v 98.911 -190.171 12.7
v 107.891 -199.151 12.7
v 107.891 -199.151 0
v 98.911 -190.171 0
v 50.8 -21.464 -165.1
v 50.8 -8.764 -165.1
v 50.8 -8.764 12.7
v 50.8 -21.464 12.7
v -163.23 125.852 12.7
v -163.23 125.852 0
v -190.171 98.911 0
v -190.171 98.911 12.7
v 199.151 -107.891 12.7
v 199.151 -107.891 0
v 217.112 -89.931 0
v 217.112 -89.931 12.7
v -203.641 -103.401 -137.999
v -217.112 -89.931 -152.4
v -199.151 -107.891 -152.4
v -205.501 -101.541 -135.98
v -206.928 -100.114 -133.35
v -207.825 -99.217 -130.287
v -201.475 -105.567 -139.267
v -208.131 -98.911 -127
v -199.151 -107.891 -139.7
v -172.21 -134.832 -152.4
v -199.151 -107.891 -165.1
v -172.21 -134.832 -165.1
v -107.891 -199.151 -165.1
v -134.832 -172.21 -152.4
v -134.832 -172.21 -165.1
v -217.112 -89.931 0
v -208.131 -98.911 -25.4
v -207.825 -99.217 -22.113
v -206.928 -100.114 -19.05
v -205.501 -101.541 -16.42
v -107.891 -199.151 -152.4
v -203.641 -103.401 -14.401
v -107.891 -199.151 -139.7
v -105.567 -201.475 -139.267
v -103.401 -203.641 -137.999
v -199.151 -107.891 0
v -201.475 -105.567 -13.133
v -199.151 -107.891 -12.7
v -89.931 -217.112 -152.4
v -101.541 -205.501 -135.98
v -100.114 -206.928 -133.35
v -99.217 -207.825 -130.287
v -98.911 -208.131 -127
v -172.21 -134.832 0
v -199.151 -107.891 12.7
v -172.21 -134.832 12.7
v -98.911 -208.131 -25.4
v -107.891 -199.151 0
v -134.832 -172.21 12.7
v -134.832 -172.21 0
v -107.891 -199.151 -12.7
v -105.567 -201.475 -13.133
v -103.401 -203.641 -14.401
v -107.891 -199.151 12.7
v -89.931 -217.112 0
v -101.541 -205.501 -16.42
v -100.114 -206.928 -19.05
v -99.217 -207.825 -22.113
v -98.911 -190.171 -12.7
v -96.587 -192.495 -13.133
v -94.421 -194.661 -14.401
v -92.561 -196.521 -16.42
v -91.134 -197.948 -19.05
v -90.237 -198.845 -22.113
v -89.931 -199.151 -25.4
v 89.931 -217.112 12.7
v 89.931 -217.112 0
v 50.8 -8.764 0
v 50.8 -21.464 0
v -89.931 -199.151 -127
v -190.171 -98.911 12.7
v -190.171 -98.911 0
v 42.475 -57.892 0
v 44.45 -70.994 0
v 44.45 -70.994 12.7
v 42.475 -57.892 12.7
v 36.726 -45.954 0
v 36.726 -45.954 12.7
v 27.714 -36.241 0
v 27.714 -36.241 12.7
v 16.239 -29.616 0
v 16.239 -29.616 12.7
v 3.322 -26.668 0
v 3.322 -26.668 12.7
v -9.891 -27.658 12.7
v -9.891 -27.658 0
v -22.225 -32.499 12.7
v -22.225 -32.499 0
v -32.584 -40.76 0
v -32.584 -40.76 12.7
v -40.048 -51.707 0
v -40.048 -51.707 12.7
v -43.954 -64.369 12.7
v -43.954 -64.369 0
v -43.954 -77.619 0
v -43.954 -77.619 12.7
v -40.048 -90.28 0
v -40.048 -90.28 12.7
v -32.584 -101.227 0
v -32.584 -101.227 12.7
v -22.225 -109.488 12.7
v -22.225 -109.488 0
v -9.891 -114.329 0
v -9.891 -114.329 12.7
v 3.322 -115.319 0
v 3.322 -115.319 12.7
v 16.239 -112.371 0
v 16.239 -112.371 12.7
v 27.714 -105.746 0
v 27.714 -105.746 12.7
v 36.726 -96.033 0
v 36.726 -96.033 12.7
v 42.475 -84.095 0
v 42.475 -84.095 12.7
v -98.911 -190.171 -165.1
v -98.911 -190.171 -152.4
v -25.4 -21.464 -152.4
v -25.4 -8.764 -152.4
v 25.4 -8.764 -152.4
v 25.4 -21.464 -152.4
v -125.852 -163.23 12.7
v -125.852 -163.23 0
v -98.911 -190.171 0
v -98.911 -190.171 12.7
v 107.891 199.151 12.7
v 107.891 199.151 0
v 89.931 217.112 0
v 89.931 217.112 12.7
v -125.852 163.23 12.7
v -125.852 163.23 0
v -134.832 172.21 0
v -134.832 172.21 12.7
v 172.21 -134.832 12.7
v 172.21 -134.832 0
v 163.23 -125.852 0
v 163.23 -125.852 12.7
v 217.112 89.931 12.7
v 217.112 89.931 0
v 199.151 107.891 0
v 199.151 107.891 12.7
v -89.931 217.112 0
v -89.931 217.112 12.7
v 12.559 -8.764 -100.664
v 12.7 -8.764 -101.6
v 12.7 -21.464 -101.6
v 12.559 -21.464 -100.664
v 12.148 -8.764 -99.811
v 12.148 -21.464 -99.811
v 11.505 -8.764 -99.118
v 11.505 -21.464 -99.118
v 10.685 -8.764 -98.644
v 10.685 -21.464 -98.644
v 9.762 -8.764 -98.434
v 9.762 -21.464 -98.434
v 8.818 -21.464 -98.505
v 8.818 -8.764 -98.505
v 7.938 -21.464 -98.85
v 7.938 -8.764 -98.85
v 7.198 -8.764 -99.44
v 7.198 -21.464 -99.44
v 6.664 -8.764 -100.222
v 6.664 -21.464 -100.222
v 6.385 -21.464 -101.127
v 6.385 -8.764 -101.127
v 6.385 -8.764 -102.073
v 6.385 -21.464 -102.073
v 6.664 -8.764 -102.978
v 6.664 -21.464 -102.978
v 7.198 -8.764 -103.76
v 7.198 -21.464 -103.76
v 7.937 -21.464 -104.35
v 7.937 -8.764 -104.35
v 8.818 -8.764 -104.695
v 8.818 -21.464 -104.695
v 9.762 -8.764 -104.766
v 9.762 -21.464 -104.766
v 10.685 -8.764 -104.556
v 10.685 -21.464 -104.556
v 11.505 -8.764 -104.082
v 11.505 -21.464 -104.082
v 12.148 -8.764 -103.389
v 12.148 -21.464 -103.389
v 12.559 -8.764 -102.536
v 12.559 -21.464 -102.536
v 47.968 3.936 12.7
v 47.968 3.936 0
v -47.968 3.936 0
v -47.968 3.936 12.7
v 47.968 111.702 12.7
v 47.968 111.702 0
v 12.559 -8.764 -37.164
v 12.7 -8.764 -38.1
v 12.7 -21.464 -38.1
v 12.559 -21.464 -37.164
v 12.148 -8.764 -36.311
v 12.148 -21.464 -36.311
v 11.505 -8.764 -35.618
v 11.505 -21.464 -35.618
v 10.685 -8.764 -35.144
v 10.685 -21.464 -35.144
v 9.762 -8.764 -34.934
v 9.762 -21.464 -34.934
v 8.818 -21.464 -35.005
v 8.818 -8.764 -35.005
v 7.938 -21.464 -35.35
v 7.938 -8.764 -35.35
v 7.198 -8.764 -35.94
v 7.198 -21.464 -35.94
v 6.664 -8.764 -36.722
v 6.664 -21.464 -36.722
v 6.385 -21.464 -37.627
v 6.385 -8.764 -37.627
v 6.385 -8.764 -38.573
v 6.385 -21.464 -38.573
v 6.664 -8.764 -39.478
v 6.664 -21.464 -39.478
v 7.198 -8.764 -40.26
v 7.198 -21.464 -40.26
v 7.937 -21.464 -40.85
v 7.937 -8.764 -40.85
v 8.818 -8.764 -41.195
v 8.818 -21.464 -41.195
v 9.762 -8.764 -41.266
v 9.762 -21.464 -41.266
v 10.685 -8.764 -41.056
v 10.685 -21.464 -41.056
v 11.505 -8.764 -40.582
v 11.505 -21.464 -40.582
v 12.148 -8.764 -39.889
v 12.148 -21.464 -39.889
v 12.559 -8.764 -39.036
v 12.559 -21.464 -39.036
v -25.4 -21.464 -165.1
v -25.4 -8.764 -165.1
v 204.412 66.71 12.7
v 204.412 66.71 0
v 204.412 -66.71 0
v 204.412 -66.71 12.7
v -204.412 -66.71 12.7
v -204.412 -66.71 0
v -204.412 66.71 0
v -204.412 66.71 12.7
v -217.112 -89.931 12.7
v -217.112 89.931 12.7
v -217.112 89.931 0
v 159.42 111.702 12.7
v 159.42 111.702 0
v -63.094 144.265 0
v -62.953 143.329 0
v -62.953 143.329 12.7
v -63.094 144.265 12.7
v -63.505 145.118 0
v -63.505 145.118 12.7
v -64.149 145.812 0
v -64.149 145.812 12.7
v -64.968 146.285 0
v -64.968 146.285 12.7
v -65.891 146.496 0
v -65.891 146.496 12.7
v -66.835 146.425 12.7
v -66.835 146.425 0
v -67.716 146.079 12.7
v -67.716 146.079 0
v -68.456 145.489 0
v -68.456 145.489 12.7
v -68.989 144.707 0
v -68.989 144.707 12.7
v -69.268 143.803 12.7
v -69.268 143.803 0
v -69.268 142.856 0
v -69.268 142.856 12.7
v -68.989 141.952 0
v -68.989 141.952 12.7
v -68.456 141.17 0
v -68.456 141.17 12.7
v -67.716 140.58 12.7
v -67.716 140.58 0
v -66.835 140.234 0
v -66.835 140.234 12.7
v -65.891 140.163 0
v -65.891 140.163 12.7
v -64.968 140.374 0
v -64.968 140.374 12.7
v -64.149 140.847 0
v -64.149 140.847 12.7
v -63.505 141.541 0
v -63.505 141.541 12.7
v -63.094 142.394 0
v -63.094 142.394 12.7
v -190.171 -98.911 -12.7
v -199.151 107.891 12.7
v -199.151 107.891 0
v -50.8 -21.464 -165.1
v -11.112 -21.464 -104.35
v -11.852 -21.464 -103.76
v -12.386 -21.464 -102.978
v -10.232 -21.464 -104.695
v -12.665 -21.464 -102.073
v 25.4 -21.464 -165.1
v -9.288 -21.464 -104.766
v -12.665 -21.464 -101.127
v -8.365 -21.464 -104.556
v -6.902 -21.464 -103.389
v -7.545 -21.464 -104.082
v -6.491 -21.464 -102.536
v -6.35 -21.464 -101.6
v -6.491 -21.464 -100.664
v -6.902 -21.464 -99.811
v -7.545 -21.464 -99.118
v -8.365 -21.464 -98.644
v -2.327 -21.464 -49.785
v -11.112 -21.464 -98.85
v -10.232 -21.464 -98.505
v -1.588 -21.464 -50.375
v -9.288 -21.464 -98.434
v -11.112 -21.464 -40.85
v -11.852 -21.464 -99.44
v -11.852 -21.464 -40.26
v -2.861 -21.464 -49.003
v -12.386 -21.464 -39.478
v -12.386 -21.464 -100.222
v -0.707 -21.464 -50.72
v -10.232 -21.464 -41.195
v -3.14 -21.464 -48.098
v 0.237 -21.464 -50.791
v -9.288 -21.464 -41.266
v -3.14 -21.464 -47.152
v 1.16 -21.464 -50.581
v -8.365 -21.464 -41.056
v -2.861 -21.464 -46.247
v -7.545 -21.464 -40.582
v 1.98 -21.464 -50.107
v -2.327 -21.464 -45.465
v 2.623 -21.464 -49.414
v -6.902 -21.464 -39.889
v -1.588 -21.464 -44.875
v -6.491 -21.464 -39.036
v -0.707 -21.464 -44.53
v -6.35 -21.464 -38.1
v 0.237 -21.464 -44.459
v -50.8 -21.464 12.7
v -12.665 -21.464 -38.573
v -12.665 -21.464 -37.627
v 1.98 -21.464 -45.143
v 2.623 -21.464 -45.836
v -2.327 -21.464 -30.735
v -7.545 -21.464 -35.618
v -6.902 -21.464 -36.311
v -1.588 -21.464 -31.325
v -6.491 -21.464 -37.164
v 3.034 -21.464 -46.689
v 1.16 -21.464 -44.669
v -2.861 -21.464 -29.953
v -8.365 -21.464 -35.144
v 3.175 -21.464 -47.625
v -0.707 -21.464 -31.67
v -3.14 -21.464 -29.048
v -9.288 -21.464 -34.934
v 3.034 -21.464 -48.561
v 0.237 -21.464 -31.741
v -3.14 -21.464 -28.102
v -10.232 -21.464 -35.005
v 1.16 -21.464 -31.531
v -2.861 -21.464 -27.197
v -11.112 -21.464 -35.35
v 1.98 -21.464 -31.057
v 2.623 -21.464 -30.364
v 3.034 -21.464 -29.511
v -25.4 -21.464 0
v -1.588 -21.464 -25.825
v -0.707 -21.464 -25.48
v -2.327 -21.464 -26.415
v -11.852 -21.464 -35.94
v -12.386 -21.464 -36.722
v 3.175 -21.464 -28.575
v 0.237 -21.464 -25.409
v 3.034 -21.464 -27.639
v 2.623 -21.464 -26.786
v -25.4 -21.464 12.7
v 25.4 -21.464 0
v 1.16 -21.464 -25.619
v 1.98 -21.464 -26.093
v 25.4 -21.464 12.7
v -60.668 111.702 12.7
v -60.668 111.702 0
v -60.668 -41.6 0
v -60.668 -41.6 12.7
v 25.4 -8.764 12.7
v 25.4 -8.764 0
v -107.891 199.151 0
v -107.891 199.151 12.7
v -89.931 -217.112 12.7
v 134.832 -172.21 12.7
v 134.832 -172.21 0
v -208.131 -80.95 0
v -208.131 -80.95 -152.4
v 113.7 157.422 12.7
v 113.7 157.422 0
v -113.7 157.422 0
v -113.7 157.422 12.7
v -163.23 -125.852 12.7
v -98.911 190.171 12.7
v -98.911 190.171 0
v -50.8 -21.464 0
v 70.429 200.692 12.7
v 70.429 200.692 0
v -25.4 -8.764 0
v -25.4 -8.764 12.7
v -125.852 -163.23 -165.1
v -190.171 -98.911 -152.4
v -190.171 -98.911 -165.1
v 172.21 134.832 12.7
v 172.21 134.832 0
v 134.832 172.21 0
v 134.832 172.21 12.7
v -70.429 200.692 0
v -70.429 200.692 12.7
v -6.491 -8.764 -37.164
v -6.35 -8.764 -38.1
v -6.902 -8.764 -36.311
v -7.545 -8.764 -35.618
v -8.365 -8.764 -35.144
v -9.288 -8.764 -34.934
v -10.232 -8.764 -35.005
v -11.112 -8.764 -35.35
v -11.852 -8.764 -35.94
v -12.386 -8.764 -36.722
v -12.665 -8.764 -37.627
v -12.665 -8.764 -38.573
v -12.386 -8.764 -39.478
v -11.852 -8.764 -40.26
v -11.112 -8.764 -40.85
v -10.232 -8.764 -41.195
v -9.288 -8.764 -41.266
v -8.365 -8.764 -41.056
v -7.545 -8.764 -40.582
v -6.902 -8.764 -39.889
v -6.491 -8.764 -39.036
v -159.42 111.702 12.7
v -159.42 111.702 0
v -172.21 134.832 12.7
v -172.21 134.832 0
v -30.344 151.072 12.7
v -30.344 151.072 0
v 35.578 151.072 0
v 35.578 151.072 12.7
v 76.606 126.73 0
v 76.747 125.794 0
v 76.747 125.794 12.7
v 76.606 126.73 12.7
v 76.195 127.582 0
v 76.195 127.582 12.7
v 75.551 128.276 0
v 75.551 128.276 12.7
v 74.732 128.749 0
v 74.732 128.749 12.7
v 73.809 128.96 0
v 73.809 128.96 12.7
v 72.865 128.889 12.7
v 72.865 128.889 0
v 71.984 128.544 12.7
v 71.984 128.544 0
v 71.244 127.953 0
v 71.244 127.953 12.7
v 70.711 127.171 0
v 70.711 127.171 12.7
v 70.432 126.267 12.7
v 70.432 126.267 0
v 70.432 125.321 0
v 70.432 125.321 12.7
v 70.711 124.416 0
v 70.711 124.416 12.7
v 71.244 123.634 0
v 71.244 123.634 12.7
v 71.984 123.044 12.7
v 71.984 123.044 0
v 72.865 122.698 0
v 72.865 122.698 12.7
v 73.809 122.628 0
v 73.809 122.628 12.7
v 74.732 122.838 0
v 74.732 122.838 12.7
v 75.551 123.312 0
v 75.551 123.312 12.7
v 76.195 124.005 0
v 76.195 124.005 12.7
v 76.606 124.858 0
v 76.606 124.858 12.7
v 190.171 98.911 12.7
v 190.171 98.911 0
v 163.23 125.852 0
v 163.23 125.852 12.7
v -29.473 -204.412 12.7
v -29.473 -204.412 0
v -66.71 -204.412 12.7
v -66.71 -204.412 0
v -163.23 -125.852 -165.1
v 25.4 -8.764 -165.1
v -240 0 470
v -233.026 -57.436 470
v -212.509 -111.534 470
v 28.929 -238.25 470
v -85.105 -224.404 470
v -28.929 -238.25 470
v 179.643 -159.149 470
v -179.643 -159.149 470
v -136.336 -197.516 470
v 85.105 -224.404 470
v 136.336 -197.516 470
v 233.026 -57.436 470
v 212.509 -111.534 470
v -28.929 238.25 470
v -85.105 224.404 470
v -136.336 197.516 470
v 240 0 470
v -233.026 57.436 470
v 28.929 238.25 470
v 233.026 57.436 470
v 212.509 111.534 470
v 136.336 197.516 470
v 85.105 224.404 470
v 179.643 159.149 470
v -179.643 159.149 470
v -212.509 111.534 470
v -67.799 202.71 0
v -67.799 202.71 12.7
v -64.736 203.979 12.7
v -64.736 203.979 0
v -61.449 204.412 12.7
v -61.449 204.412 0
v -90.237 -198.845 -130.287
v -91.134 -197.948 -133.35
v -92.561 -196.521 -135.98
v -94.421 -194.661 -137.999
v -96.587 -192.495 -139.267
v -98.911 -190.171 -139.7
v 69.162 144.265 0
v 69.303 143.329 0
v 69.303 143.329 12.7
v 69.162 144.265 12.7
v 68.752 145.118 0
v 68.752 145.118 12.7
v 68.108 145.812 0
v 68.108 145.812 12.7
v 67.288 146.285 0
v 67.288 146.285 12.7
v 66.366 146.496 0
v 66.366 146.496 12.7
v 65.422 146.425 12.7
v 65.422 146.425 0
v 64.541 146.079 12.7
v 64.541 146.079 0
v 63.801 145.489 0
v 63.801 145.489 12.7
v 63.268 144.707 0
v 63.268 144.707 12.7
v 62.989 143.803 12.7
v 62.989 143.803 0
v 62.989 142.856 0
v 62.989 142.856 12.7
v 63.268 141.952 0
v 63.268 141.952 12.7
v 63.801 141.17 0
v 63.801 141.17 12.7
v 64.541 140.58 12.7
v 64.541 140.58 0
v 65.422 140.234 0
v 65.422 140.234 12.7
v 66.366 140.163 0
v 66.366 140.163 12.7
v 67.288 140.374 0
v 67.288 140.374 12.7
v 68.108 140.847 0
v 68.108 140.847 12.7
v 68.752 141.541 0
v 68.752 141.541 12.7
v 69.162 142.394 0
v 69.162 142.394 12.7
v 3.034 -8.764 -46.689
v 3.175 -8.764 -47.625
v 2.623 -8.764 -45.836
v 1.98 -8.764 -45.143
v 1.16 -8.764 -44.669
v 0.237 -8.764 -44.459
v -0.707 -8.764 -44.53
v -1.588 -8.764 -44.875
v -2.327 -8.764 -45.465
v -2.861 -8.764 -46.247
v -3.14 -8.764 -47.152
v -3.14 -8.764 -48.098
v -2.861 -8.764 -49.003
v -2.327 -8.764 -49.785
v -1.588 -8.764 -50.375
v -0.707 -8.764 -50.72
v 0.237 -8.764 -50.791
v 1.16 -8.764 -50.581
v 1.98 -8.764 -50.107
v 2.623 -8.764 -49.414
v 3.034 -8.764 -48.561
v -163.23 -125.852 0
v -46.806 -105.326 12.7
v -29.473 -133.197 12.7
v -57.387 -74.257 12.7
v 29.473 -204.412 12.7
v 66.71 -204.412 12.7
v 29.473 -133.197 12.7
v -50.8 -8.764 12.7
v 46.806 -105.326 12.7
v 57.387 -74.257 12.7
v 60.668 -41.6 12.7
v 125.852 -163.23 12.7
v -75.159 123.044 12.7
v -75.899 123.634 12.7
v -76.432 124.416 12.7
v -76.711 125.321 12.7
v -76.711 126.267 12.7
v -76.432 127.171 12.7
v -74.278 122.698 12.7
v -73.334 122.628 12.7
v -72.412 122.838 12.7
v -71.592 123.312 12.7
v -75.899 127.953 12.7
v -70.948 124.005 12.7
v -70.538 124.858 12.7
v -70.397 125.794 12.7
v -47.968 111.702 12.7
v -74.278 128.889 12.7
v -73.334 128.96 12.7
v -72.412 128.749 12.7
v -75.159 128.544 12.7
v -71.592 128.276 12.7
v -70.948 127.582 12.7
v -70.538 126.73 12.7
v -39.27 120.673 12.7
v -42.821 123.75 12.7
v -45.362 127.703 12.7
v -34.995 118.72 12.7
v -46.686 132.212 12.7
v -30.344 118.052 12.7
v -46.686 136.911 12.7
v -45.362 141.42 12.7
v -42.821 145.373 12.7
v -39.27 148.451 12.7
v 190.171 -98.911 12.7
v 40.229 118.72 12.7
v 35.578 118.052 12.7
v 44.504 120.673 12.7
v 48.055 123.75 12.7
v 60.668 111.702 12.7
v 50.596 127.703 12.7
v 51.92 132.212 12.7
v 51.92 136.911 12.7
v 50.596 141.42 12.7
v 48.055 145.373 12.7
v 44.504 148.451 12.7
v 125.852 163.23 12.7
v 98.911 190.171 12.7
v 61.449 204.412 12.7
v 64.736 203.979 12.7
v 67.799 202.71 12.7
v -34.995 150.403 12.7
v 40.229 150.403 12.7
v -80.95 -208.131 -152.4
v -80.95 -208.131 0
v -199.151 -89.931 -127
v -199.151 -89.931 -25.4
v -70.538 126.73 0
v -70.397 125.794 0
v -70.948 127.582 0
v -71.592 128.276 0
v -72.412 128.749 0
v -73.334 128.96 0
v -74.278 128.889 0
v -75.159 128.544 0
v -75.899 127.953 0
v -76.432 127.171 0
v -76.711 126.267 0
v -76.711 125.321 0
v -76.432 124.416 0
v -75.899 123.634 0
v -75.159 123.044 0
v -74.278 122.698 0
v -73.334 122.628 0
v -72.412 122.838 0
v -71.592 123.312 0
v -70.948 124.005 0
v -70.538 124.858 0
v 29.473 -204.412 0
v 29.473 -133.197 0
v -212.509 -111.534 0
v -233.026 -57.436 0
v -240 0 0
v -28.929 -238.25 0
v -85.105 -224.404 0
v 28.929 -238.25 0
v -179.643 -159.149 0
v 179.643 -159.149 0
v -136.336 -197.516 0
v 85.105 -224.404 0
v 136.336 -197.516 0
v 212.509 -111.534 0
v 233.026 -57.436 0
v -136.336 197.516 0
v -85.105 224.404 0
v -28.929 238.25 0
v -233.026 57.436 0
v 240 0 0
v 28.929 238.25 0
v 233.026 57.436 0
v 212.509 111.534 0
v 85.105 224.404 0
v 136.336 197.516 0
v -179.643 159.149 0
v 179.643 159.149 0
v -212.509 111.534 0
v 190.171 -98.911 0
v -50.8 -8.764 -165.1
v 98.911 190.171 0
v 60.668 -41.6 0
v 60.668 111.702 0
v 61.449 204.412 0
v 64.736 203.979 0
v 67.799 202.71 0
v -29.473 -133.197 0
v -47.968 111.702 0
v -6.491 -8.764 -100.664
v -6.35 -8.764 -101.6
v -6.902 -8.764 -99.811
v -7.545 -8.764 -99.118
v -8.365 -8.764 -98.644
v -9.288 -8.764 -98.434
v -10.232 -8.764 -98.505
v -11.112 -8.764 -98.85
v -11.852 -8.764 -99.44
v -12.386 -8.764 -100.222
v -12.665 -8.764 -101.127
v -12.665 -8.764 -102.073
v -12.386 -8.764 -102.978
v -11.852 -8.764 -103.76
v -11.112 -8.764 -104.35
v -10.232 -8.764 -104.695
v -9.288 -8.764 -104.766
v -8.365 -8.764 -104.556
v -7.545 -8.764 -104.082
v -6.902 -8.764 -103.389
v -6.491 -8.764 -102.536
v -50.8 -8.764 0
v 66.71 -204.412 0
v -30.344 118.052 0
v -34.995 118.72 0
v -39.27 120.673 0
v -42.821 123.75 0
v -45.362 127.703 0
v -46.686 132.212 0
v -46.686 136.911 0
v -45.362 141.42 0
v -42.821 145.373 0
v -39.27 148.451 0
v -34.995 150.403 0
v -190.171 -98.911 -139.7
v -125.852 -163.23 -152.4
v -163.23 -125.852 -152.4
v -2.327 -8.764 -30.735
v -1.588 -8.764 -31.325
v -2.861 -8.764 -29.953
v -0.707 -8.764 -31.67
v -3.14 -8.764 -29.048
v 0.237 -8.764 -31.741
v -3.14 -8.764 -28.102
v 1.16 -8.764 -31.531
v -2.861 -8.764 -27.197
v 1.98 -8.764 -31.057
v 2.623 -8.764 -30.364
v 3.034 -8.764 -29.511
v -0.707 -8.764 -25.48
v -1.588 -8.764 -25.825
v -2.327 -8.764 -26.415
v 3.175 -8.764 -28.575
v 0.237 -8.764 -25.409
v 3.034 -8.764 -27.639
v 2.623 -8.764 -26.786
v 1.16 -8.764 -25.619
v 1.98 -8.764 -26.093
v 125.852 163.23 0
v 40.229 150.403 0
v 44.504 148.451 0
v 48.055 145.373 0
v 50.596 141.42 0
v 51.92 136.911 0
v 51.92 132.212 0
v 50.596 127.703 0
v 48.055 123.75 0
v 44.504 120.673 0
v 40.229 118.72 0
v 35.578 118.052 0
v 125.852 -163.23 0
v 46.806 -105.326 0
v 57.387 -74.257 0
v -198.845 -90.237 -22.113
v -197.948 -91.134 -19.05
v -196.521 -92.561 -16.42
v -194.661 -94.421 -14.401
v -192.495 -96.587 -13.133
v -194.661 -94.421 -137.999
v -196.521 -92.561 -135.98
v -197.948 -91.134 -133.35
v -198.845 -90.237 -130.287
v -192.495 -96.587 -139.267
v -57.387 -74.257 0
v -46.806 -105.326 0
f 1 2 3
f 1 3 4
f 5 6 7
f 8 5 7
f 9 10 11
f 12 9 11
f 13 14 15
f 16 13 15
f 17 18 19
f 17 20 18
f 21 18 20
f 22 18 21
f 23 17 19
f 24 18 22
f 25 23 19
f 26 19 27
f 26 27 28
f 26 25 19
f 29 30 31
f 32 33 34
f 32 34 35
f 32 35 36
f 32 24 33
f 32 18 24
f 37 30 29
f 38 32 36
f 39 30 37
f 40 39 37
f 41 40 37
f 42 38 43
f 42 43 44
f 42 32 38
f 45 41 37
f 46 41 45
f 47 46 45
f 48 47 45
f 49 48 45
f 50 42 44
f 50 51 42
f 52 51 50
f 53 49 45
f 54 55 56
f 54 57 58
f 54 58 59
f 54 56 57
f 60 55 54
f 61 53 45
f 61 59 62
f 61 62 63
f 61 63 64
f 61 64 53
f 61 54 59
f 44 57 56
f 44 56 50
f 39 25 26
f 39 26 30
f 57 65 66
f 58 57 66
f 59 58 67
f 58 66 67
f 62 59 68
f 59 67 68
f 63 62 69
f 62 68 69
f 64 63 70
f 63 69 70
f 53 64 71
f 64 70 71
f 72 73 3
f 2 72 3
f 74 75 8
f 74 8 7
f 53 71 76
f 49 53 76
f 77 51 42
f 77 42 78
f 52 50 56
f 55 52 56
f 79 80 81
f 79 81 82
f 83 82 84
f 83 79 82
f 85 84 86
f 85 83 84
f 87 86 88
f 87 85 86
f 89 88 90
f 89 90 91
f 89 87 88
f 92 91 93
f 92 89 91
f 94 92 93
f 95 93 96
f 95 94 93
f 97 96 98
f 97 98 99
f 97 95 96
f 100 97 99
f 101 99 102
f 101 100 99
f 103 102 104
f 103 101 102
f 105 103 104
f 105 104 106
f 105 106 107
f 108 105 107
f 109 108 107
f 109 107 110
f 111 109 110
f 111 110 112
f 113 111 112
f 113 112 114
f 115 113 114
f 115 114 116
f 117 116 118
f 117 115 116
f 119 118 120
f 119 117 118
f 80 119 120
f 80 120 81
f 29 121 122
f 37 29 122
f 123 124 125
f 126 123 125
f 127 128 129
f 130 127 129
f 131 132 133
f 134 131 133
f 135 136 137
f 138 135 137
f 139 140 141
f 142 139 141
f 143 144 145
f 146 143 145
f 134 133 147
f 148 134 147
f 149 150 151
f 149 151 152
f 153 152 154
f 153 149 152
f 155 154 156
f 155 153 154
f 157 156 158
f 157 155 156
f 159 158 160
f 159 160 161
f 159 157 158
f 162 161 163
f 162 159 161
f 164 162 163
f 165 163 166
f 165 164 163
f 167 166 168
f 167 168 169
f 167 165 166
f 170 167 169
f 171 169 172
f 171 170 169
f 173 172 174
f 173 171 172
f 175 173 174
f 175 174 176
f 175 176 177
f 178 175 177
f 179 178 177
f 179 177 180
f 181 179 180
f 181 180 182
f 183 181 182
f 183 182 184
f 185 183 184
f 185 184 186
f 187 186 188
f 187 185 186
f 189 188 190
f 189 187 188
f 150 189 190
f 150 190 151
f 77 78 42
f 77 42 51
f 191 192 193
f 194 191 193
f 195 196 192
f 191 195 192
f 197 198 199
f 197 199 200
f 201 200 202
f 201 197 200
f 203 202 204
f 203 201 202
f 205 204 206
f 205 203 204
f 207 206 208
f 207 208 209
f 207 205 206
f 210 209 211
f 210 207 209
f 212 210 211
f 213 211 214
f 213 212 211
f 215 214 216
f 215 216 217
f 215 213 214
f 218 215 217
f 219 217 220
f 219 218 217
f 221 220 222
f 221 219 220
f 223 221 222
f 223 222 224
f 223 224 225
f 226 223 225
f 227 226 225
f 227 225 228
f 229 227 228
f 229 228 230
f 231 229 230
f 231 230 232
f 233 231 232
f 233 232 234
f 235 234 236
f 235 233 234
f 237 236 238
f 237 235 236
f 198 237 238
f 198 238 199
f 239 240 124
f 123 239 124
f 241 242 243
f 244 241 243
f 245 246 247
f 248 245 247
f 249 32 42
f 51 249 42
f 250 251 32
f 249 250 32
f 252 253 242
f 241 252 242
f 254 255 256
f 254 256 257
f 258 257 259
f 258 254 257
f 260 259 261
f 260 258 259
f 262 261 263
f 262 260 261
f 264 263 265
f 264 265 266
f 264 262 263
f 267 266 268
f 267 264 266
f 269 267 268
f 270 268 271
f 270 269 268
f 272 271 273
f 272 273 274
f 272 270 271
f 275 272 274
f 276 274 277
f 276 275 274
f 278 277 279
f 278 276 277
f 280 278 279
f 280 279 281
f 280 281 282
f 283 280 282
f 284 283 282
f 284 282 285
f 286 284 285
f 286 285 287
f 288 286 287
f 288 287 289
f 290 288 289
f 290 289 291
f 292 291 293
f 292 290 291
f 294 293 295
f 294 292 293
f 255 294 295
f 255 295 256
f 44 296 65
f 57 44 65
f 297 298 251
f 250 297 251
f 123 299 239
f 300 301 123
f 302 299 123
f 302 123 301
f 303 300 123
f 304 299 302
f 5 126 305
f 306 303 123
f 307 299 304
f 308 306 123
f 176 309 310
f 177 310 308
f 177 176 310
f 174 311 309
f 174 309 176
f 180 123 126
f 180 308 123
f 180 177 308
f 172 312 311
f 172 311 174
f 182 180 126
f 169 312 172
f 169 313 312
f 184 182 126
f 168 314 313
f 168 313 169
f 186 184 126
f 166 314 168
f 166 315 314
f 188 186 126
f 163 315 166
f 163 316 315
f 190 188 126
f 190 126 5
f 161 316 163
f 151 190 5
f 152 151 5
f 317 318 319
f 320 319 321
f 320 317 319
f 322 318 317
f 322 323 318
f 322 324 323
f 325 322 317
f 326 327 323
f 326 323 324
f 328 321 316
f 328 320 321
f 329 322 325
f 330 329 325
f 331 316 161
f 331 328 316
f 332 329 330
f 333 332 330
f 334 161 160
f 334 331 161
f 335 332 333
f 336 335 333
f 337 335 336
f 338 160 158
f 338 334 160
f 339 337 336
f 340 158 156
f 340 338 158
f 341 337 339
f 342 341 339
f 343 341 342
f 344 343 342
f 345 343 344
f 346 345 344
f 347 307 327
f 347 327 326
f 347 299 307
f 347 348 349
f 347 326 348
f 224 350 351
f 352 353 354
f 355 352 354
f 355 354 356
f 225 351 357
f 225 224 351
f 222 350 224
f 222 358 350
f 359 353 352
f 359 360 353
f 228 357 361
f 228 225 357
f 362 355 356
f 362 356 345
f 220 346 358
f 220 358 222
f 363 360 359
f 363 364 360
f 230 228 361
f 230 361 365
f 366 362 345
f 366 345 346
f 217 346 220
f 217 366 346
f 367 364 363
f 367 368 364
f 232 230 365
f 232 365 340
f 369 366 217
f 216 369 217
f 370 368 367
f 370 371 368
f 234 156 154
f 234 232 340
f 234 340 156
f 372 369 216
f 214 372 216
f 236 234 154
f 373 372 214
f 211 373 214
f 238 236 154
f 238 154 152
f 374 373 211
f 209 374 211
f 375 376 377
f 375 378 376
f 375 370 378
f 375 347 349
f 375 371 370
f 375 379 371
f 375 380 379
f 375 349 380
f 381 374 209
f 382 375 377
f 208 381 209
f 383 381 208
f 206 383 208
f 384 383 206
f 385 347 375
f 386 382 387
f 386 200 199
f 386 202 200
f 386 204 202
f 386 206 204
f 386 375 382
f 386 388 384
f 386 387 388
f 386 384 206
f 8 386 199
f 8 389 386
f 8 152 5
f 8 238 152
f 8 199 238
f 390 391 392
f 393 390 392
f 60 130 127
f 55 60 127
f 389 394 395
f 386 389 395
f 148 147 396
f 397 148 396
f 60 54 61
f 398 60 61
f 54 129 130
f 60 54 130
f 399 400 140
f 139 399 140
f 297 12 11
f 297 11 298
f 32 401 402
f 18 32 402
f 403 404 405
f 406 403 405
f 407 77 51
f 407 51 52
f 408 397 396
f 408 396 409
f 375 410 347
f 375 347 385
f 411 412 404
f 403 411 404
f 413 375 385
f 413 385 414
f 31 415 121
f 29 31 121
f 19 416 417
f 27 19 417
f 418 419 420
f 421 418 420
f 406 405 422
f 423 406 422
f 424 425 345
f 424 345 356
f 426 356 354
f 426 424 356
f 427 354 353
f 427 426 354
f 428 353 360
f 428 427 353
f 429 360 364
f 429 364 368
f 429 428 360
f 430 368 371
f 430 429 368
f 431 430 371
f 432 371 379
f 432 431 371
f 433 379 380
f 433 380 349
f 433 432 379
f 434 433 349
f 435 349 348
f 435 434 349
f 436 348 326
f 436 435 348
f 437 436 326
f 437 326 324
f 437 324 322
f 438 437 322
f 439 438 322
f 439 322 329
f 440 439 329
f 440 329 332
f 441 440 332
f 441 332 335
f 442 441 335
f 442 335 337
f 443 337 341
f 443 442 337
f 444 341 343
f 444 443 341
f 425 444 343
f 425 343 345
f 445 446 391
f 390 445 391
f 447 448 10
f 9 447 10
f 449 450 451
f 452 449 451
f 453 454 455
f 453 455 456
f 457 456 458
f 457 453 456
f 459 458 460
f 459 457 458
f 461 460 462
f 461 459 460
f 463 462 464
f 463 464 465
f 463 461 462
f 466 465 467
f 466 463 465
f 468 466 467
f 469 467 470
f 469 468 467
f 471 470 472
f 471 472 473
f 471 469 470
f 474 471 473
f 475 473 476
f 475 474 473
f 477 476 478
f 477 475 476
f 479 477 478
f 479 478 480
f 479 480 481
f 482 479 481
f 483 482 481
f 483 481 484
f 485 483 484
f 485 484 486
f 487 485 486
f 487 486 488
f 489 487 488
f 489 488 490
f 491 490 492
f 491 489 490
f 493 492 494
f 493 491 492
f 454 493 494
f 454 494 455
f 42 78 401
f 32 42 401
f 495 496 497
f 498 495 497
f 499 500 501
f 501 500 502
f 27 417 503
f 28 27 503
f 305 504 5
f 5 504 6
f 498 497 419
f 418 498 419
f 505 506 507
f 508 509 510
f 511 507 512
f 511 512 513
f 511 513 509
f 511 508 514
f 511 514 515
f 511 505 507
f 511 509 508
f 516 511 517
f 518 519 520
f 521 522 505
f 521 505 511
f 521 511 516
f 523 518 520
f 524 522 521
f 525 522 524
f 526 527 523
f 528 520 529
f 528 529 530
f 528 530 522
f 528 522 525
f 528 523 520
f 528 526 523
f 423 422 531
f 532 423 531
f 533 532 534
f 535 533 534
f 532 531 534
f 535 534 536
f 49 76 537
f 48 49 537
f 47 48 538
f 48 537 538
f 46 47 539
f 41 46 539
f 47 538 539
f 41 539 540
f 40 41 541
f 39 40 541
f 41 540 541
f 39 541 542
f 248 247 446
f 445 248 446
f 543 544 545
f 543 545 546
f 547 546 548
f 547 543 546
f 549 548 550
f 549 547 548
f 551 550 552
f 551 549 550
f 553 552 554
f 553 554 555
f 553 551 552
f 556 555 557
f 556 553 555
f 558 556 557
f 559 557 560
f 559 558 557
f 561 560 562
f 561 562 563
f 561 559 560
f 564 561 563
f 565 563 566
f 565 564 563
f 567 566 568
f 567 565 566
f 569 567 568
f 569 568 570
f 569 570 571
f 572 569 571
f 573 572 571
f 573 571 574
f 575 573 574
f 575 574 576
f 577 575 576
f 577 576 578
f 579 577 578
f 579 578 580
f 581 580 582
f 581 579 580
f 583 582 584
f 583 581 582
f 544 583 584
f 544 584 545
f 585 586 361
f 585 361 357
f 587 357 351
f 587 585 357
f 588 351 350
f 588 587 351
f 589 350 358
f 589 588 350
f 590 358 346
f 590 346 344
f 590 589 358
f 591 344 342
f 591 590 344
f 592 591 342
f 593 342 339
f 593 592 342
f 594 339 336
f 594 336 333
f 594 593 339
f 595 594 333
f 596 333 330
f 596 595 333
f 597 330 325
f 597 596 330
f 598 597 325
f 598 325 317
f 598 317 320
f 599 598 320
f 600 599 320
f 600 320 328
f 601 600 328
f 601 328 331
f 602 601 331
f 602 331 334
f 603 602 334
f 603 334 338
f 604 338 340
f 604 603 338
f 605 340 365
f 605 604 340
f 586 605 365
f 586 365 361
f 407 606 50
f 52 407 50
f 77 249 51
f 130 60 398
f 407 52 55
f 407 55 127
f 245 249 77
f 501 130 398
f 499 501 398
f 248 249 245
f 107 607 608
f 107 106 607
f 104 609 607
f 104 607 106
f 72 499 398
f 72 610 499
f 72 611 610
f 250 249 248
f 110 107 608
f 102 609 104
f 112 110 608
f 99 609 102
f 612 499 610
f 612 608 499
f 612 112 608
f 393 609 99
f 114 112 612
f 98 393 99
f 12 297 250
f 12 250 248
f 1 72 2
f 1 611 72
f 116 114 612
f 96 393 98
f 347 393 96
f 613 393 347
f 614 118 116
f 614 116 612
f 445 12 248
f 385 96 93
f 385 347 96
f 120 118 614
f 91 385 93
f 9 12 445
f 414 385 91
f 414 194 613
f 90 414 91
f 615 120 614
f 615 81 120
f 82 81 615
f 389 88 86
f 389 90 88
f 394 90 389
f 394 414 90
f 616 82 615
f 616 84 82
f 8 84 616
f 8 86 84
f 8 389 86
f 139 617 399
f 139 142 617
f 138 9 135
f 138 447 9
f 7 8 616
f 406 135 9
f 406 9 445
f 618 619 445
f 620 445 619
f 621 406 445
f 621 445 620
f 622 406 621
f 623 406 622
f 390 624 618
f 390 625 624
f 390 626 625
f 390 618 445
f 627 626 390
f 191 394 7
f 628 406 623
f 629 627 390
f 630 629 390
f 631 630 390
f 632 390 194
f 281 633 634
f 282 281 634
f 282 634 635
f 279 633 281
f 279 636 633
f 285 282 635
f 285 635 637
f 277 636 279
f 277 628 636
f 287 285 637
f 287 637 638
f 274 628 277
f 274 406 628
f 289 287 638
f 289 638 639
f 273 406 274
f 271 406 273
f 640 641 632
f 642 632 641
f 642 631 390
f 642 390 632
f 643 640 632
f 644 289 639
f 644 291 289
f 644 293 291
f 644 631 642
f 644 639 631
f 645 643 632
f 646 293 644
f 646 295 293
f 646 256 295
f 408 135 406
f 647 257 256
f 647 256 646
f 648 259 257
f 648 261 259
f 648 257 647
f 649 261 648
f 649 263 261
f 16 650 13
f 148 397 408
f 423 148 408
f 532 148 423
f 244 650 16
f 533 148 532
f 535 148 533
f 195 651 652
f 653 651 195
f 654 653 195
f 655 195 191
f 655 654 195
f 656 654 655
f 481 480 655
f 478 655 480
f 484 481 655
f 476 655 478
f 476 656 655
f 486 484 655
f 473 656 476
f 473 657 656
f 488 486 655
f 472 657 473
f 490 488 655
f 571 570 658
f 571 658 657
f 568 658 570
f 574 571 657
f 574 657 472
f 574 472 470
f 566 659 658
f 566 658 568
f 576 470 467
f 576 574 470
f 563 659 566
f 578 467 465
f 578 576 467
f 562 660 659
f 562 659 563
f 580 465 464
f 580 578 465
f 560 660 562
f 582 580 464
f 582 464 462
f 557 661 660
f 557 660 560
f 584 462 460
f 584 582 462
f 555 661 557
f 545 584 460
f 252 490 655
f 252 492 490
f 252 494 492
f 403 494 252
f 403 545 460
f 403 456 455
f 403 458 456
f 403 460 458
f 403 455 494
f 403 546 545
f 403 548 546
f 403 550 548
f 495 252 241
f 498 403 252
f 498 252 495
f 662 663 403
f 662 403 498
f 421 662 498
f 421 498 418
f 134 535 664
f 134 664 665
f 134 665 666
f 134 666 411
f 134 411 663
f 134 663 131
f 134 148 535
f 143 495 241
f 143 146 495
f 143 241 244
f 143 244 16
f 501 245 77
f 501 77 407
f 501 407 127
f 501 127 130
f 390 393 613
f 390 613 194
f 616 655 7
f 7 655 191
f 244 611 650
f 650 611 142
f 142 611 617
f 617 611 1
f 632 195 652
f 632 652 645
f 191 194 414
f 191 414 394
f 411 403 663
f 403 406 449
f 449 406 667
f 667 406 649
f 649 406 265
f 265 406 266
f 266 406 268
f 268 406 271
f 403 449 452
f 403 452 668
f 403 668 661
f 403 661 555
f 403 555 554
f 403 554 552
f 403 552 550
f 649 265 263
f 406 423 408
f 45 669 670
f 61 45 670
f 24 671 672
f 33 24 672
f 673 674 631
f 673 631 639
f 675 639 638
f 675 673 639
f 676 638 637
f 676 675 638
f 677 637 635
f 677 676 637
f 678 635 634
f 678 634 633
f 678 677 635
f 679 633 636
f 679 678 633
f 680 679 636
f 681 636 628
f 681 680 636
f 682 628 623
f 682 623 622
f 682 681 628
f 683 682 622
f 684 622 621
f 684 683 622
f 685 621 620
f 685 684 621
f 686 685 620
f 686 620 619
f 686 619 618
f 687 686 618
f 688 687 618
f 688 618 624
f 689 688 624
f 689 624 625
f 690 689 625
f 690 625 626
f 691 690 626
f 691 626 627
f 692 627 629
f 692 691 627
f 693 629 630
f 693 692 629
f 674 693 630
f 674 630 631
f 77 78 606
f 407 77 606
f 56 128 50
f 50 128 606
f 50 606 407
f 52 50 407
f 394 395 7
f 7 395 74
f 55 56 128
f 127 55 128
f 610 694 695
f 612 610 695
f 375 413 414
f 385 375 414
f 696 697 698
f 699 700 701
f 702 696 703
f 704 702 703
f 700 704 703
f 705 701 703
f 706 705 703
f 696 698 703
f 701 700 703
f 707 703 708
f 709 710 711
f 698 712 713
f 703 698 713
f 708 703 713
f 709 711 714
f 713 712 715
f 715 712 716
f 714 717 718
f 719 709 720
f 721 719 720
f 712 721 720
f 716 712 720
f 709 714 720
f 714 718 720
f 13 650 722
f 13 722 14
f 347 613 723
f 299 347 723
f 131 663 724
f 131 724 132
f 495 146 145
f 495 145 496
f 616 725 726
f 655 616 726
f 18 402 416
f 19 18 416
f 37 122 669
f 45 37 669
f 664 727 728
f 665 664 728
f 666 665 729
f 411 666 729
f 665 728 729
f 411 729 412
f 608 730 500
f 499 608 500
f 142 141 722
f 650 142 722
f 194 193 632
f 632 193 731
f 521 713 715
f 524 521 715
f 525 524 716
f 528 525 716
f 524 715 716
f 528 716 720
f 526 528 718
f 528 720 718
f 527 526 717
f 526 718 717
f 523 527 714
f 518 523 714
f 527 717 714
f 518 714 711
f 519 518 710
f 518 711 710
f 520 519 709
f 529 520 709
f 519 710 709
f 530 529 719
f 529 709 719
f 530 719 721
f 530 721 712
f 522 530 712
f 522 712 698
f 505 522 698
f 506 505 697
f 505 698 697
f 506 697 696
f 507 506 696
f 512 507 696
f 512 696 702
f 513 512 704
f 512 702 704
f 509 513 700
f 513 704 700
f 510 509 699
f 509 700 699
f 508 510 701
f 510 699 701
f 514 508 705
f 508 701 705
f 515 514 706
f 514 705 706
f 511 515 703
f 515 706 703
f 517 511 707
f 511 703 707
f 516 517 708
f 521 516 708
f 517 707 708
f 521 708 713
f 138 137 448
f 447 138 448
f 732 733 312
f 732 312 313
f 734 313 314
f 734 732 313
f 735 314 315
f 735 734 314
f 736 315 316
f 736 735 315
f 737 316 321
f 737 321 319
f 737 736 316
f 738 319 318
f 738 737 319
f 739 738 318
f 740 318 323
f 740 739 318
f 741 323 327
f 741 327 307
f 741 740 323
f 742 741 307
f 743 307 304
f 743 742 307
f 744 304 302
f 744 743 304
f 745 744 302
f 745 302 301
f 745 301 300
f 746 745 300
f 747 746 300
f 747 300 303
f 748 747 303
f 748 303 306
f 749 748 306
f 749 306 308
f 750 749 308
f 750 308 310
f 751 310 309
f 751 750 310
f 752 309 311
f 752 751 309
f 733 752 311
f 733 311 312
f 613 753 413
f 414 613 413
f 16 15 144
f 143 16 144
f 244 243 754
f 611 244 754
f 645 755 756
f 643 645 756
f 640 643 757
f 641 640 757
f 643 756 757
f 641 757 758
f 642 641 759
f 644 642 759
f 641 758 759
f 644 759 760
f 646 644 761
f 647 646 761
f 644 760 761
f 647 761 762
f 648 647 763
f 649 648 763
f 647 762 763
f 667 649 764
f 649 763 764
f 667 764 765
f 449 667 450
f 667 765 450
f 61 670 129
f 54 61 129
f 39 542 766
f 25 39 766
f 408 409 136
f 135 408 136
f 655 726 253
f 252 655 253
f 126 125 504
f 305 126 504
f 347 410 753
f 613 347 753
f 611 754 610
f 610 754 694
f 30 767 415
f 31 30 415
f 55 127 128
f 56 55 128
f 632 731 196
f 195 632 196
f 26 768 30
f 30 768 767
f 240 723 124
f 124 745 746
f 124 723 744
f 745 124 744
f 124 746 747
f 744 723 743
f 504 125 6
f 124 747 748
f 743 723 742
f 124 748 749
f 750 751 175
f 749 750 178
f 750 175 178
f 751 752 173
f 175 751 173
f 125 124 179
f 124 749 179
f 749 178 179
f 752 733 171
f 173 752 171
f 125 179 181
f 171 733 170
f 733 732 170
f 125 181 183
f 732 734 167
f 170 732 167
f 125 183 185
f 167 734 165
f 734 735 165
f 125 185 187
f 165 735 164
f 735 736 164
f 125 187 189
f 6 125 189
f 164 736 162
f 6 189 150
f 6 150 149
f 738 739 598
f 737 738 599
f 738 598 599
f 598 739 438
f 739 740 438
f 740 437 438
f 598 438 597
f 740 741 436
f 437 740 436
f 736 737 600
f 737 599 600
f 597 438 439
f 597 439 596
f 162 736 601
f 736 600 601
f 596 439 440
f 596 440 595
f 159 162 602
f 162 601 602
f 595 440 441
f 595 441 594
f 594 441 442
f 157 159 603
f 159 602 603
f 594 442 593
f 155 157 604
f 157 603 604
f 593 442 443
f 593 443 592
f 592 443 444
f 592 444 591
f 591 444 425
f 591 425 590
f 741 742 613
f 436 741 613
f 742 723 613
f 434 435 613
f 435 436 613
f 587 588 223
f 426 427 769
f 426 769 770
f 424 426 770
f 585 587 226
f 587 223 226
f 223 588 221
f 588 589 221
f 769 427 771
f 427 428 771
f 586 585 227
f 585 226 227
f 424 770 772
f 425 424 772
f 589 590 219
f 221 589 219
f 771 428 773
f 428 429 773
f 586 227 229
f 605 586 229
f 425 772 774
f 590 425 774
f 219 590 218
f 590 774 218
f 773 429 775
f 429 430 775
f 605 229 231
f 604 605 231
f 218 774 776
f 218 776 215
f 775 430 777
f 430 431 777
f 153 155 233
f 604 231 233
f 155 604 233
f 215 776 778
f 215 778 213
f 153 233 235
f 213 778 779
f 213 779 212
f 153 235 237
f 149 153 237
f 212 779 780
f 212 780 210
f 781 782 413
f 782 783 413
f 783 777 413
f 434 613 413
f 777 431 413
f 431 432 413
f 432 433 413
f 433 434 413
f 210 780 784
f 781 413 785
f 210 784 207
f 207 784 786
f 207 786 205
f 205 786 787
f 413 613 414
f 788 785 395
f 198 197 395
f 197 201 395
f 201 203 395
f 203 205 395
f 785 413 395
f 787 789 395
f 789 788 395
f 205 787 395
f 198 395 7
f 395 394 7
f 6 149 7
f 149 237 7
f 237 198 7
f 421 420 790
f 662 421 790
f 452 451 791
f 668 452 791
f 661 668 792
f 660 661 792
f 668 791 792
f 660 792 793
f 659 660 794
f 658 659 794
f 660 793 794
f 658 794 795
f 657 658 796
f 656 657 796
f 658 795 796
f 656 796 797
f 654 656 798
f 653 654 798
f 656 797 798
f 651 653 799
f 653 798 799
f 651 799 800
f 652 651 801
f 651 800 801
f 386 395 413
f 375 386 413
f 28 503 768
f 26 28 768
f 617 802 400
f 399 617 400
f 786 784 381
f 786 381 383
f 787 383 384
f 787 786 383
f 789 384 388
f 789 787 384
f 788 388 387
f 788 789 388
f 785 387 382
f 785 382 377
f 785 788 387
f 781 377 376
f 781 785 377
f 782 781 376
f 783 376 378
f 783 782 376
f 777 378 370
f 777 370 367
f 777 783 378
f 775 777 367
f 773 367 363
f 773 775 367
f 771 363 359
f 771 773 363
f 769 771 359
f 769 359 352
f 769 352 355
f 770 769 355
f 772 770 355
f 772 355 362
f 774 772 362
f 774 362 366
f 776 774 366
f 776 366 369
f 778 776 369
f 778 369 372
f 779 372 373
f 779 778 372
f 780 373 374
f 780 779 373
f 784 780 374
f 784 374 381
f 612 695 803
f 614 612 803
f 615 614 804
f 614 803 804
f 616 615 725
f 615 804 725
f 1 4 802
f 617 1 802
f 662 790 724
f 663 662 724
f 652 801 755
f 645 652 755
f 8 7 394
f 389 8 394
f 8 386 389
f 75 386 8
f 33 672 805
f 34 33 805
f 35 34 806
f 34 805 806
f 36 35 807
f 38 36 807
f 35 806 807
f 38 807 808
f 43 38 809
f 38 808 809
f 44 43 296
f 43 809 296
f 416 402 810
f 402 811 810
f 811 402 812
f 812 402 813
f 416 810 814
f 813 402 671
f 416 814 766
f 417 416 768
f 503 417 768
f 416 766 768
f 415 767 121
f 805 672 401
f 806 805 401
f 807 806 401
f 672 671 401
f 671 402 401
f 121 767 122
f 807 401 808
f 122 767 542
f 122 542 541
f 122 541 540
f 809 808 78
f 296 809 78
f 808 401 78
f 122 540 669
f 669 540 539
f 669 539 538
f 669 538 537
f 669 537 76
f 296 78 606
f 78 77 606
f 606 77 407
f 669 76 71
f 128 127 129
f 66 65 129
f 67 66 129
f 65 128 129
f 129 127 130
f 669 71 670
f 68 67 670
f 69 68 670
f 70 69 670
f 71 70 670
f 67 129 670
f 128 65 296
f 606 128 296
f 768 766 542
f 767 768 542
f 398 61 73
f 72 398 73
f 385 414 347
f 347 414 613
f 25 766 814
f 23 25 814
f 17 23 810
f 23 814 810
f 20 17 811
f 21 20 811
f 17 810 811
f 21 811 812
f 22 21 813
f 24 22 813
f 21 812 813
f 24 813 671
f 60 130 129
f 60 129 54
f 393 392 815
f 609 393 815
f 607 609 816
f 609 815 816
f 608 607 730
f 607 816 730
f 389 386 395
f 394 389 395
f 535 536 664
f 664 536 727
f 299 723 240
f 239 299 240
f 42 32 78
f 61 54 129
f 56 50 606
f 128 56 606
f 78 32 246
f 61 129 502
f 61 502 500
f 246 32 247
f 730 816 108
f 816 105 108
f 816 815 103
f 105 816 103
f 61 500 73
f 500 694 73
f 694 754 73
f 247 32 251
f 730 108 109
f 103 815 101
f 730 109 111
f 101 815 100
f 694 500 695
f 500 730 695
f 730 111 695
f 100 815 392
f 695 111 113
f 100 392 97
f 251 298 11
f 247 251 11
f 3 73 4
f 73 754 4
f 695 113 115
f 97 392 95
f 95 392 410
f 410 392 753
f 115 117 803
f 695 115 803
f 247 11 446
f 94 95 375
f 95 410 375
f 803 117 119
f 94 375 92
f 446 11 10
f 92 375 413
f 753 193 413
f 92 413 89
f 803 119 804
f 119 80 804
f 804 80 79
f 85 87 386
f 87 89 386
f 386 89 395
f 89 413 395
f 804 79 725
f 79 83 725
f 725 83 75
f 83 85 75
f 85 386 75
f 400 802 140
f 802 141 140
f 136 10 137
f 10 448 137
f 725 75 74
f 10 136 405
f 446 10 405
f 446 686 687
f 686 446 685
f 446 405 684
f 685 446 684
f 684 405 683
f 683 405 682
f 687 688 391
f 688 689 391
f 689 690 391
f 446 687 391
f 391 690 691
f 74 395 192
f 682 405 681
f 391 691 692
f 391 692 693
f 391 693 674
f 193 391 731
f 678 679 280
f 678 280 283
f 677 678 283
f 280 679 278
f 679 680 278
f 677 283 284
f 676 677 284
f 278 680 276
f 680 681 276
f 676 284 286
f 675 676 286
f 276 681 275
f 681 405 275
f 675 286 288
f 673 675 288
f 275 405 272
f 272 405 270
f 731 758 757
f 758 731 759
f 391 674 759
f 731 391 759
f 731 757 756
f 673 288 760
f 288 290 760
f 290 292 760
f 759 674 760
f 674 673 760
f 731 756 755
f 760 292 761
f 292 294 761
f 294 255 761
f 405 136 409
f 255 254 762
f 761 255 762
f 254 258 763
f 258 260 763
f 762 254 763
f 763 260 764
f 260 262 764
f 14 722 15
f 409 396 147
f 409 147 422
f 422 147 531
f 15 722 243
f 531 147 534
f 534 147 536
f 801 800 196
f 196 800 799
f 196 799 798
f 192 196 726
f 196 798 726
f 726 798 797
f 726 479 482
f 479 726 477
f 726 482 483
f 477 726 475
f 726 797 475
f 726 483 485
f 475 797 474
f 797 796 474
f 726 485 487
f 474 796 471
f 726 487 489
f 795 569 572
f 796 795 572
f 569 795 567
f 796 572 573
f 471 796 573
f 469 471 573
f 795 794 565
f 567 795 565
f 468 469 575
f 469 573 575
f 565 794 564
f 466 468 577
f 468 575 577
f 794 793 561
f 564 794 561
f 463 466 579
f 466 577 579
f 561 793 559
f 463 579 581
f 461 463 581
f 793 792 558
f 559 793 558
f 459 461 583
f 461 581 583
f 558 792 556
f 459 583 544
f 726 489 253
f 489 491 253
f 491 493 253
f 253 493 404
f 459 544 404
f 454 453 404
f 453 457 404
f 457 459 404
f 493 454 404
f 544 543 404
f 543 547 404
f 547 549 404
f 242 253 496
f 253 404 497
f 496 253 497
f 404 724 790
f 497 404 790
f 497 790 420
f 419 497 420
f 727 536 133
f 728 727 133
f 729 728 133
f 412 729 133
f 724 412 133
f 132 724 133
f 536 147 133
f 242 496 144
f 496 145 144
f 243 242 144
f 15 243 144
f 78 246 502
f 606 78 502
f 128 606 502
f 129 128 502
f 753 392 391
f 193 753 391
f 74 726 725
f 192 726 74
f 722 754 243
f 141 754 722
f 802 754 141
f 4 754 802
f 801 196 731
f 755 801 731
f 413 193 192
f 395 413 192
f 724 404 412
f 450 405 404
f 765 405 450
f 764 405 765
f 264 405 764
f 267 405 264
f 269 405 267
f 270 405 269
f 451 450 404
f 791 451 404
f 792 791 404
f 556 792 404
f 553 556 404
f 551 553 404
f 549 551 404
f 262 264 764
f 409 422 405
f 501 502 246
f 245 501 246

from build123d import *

# Parameters (mm, degrees)
F0_R     = 240
F1_DEPTH = 470
F2_R     = 3.175
F2_W     = 25.4
F2_H     = 12.7
F2_R_2   = 44.45
F3_DEPTH = 12.7
F4_W     = 38.1
F4_H     = 12.7
F5_DEPTH = 12.7
F6_R     = 3.175
F7_DEPTH = 12.7


# Not quite as in the source:
# - a feature names something its author has since deleted; it is built from what else it names


with BuildPart() as f1:
    # F0 (on Top) → F1 (new body)
    with BuildSketch(Plane.XY):
        Circle(F0_R)
    extrude(amount=F1_DEPTH)


with BuildPart() as f3:
    # F2 (on Top) → F3 (new body)
    with BuildSketch(Plane.XY):
        Polygon((107.8911188479, 199.151177898), (89.9306066058, 217.1116901402), (-89.9306066058, 217.1116901402), (-107.8911188479, 199.151177898), (-98.9108627269, 190.1709217769), (-125.8516310901, 163.2301534137), (-134.8318872111, 172.2104095348), (-172.2104095348, 134.8318872111), (-163.2301534137, 125.8516310901), (-190.1709217769, 98.9108627269), (-199.151177898, 107.8911188479), (-217.1116901402, 89.9306066058), (-217.1116901402, -89.9306066058), (-199.151177898, -107.8911188479), (-190.1709217769, -98.9108627269), (-163.2301534137, -125.8516310901), (-172.2104095348, -134.8318872111), (-134.8318872111, -172.2104095348), (-125.8516310901, -163.2301534137), (-98.9108627269, -190.1709217769), (-107.8911188479, -199.151177898), (-89.9306066058, -217.1116901402), (89.9306066058, -217.1116901402), (107.8911188479, -199.151177898), (98.9108627269, -190.1709217769), (125.8516310901, -163.2301534137), (134.8318872111, -172.2104095348), (172.2104095348, -134.8318872111), (163.2301534137, -125.8516310901), (190.1709217769, -98.9108627269), (199.151177898, -107.8911188479), (217.1116901402, -89.9306066058), (217.1116901402, 89.9306066058), (199.151177898, 107.8911188479), (190.1709217769, 98.9108627269), (163.2301534137, 125.8516310901), (172.2104095348, 134.8318872111), (134.8318872111, 172.2104095348), (125.8516310901, 163.2301534137), (98.9108627269, 190.1709217769), align=None)
        Polygon((-204.4116901402, -66.7095821215), (-204.4116901402, 66.7095821215), (-159.4195821215, 111.7016901402), (-60.6675371528, 111.7016901402), (-47.9675371528, 111.7016901402), (47.9675371528, 111.7016901402), (60.6675371528, 111.7016901402), (159.4195821215, 111.7016901402), (204.4116901402, 66.7095821215), (204.4116901402, -66.7095821215), (66.7095821215, -204.4116901402), (29.473233968, -204.4116901402), (-29.473233968, -204.4116901402), (-66.7095821215, -204.4116901402), align=None, mode=Mode.SUBTRACT)
        with Locations((-73.5717139989, 125.793881411)):
            Circle(F2_R, mode=Mode.SUBTRACT)
        with Locations((-66.1282860011, 143.3294988693)):
            Circle(F2_R, mode=Mode.SUBTRACT)
        with BuildLine():
            ThreePointArc((-30.343759404, 118.0516901402), (-46.853759404, 134.5616901402), (-30.343759404, 151.0716901402))
            Line((-30.343759404, 151.0716901402), (35.57801324, 151.0716901402))
            ThreePointArc((35.57801324, 151.0716901402), (52.08801324, 134.5616901402), (35.57801324, 118.0516901402))
            Line((35.57801324, 118.0516901402), (-30.343759404, 118.0516901402))
        make_face(mode=Mode.SUBTRACT)
        with Locations((73.5717139989, 125.793881411)):
            Circle(F2_R, mode=Mode.SUBTRACT)
        with Locations((66.1282860011, 143.3294988693)):
            Circle(F2_R, mode=Mode.SUBTRACT)
        with BuildLine():
            ThreePointArc((61.4490698794, 204.4116901402), (66.3091494704, 203.444960203), (70.4293260004, 200.6919462612))
            Line((70.4293260004, 200.6919462612), (113.6995821215, 157.4216901402))
            Line((113.6995821215, 157.4216901402), (-113.6995821215, 157.4216901402))
            Line((-113.6995821215, 157.4216901402), (-70.4293260004, 200.6919462612))
            ThreePointArc((-70.4293260004, 200.6919462612), (-66.3091494704, 203.444960203), (-61.4490698794, 204.4116901402))
            Line((-61.4490698794, 204.4116901402), (61.4490698794, 204.4116901402))
        make_face(mode=Mode.SUBTRACT)
        with BuildLine():
            Line((-47.9675371528, 111.7016901402), (-60.6675371528, 111.7016901402))
            Line((-60.6675371528, 111.7016901402), (-60.6675371528, -41.5995694615))
            ThreePointArc((-60.6675371528, -41.5995694615), (-52.9833960385, -90.0931268942), (-29.473233968, -133.1969946623))
            Line((-29.473233968, -133.1969946623), (-29.473233968, -204.4116901402))
            Line((-29.473233968, -204.4116901402), (29.473233968, -204.4116901402))
            Line((29.473233968, -204.4116901402), (29.473233968, -133.1969946623))
            ThreePointArc((29.473233968, -133.1969946623), (52.9833960385, -90.0931268942), (60.6675371528, -41.5995694615))
            Line((60.6675371528, -41.5995694615), (60.6675371528, 111.7016901402))
            Line((60.6675371528, 111.7016901402), (47.9675371528, 111.7016901402))
            Line((47.9675371528, 111.7016901402), (47.9675371528, 3.9363902736))
            Line((47.9675371528, 3.9363902736), (-47.9675371528, 3.9363902736))
            Line((-47.9675371528, 3.9363902736), (-47.9675371528, 111.7016901402))
        make_face()
        with Locations((-38.1, -15.1136097264)):
            Rectangle(F2_W, F2_H, mode=Mode.SUBTRACT)
        with Locations((0, -70.9936097264)):
            Circle(F2_R_2, mode=Mode.SUBTRACT)
        with Locations((38.1, -15.1136097264)):
            Rectangle(F2_W, F2_H, mode=Mode.SUBTRACT)
    extrude(amount=F3_DEPTH)


with BuildPart() as f5:
    # F4 (on face) → F5 (new body)
    with BuildSketch(Plane(origin=(-144.5408922519, -144.5408922519, 0), x_dir=(0.7071067812, -0.7071067812, 0), z_dir=(-0.7071067812, -0.7071067812, 0))):
        Polygon((-26.4306066058, 0), (-64.5306066058, 0), (-89.9306066058, 0), (-89.9306066058, -152.4), (-64.5306066058, -152.4), (-64.5306066058, -165.1), (-26.4306066058, -165.1), (-26.4306066058, -152.4), (26.4306066058, -152.4), (26.4306066058, -165.1), (64.5306066058, -165.1), (64.5306066058, -152.4), (89.9306066058, -152.4), (89.9306066058, 0), (64.5306066058, 0), (64.5306066058, 12.7), (26.4306066058, 12.7), (26.4306066058, 0), align=None)
        with BuildLine():
            Line((-64.5306066058, -12.7), (64.5306066058, -12.7))
            ThreePointArc((64.5306066058, -12.7), (73.5108627269, -16.4197438789), (77.2306066058, -25.4))
            Line((77.2306066058, -25.4), (77.2306066058, -127))
            ThreePointArc((77.2306066058, -127), (73.5108627269, -135.9802561211), (64.5306066058, -139.7))
            Line((64.5306066058, -139.7), (-64.5306066058, -139.7))
            ThreePointArc((-64.5306066058, -139.7), (-73.5108627269, -135.9802561211), (-77.2306066058, -127))
            Line((-77.2306066058, -127), (-77.2306066058, -25.4))
            ThreePointArc((-77.2306066058, -25.4), (-73.5108627269, -16.4197438789), (-64.5306066058, -12.7))
        make_face(mode=Mode.SUBTRACT)
        with Locations((-45.4806066058, 6.35)):
            Rectangle(F4_W, F4_H)
    extrude(amount=F5_DEPTH)


with BuildPart() as f7:
    # F6 (on face) → F7 (new body)
    with BuildSketch(Plane.XZ.offset(8.7636097264)):
        Polygon((25.4, 0), (-25.4, 0), (-25.4, 12.7), (-50.8, 12.7), (-50.8, 0), (-50.8, -152.4), (-50.8, -165.1), (-25.4, -165.1), (-25.4, -152.4), (25.4, -152.4), (25.4, -165.1), (50.8, -165.1), (50.8, -152.4), (50.8, 0), (50.8, 12.7), (25.4, 12.7), align=None)
        with Locations((-9.525, -101.6)):
            Circle(F6_R, mode=Mode.SUBTRACT)
        with Locations((9.525, -101.6)):
            Circle(F6_R, mode=Mode.SUBTRACT)
        with Locations((0, -47.625)):
            Circle(F6_R, mode=Mode.SUBTRACT)
        with Locations((-9.525, -38.1)):
            Circle(F6_R, mode=Mode.SUBTRACT)
        with Locations((0, -28.575)):
            Circle(F6_R, mode=Mode.SUBTRACT)
        with Locations((9.525, -38.1)):
            Circle(F6_R, mode=Mode.SUBTRACT)
    extrude(amount=F7_DEPTH)


solid = Compound([f1.part, f3.part, f5.part, f7.part])
